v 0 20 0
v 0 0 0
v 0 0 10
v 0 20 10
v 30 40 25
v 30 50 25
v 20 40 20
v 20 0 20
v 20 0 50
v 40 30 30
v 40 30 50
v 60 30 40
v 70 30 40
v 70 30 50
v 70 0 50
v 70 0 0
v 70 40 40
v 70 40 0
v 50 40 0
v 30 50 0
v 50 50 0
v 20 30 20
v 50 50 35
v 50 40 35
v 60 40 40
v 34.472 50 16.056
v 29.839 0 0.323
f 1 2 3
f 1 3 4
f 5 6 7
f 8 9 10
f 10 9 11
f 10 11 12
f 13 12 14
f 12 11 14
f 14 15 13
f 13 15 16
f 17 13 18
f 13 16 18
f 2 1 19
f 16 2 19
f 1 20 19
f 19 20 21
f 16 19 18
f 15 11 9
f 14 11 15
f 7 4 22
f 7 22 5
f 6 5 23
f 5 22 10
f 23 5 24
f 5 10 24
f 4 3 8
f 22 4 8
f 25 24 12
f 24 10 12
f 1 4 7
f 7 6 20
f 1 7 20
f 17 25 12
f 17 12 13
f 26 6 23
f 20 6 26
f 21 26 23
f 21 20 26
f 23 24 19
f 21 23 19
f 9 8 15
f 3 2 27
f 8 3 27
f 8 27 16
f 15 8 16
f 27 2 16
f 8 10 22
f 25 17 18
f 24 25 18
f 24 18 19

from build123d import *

# Parameters (mm, degrees)
SKETCH1_W           = 70
SKETCH1_H           = 50
BOSS_EXTRUDE1_DEPTH = 50
SKETCH2_W           = 20
SKETCH2_H           = 10
CUT_EXTRUDE1_DEPTH  = 50
CUT_EXTRUDE2_DEPTH  = 50
CUT_EXTRUDE3_DEPTH  = 30
SKETCH6_W           = 10
SKETCH6_H           = 10
CUT_EXTRUDE4_DEPTH  = 10
BOSS_EXTRUDE2_DEPTH = 10
CUT_EXTRUDE5_DEPTH  = 10
BOSS_EXTRUDE3_DEPTH = 10
BOSS_EXTRUDE4_DEPTH = 10
BOSS_EXTRUDE5_DEPTH = 10
BOSS_EXTRUDE6_DEPTH = 22


with BuildPart() as part:
    # Sketch1 → Boss-Extrude1 (new body)
    with BuildSketch(Plane.XY):
        with Locations((35, 25)):
            Rectangle(SKETCH1_W, SKETCH1_H)
    extrude(amount=BOSS_EXTRUDE1_DEPTH)

    # Sketch2 → Cut-Extrude1 (cut)
    with BuildSketch(Plane.XY.offset(50)):
        Polygon((0, 20), (30, 50), (0, 50), align=None)
        with Locations((60, 45)):
            Rectangle(SKETCH2_W, SKETCH2_H)
    extrude(amount=-CUT_EXTRUDE1_DEPTH, mode=Mode.SUBTRACT)

    # Sketch3 → Cut-Extrude2 (cut)
    with BuildSketch(Plane.XZ):
        Polygon((0, 10), (20, 20), (20, 50), (0, 50), align=None)
    extrude(amount=-CUT_EXTRUDE2_DEPTH, mode=Mode.SUBTRACT)

    # Sketch5 → Cut-Extrude3 (cut)
    with BuildSketch(Plane.XY.offset(50)):
        Polygon((20, 0), (40, 30), (60, 30), (60, 40), (50, 40), (50, 50), (30, 50), (20, 40), align=None)
    extrude(amount=-CUT_EXTRUDE3_DEPTH, mode=Mode.SUBTRACT)

    # Sketch6 → Cut-Extrude4 (cut)
    with BuildSketch(Plane.XY.offset(50)):
        with Locations((65, 35)):
            Rectangle(SKETCH6_W, SKETCH6_H)
    extrude(amount=-CUT_EXTRUDE4_DEPTH, mode=Mode.SUBTRACT)

    # Sketch7 → Boss-Extrude2 (add)
    with BuildSketch(Plane(origin=(0, 40, 0), x_dir=(1, 0, 0), z_dir=(0, 1, 0))):
        Polygon((60, -40), (0, -10), (60, -10), (60, -20), align=None)
    extrude(amount=-BOSS_EXTRUDE2_DEPTH)

    # Sketch8 → Cut-Extrude5 (cut)
    with BuildSketch(Plane(origin=(0, 0, 10), x_dir=(-1, 0, 0), z_dir=(0, 0, -1))):
        Polygon((0, 30), (-10, 30), (-20, 40), (0, 40), align=None)
    extrude(amount=-CUT_EXTRUDE5_DEPTH, mode=Mode.SUBTRACT)

    # Sketch9 → Boss-Extrude3 (add)
    with BuildSketch(Plane(origin=(0, 40, 0), x_dir=(1, 0, 0), z_dir=(0, 1, 0))):
        Polygon((30, -25), (50, -35), (50, -20), (30, -20), align=None)
    extrude(amount=BOSS_EXTRUDE3_DEPTH)

    # Sketch10 → Boss-Extrude4 (add)
    with BuildSketch(Plane(origin=(-4, 0, 8), x_dir=(0.894427191, 0, 0.447213595), z_dir=(-0.447213595, 0, 0.894427191))):
        Polygon((26.83281573, 40), (38.013155617, 50), (38.013155617, 40), align=None)
    extrude(amount=-BOSS_EXTRUDE4_DEPTH)

    # Sketch11 → Boss-Extrude5 (add)
    with BuildSketch(Plane(origin=(-10, 10, 0), x_dir=(0, 0, 1), z_dir=(-0.707106781, 0.707106781, 0))):
        Polygon((20, 42.426406871), (20, 56.568542495), (25, 56.568542495), align=None)
    extrude(amount=-BOSS_EXTRUDE5_DEPTH)

    # Sketch12 → Boss-Extrude6 (add)
    with BuildSketch(Plane(origin=(-4, 0, 8), x_dir=(0.894427191, 0, 0.447213595), z_dir=(-0.447213595, 0, 0.894427191))):
        Polygon((26.83281573, 0), (26.83281573, 30), (49.193495505, 30), align=None)
    extrude(amount=-BOSS_EXTRUDE6_DEPTH)


solid = part.part
